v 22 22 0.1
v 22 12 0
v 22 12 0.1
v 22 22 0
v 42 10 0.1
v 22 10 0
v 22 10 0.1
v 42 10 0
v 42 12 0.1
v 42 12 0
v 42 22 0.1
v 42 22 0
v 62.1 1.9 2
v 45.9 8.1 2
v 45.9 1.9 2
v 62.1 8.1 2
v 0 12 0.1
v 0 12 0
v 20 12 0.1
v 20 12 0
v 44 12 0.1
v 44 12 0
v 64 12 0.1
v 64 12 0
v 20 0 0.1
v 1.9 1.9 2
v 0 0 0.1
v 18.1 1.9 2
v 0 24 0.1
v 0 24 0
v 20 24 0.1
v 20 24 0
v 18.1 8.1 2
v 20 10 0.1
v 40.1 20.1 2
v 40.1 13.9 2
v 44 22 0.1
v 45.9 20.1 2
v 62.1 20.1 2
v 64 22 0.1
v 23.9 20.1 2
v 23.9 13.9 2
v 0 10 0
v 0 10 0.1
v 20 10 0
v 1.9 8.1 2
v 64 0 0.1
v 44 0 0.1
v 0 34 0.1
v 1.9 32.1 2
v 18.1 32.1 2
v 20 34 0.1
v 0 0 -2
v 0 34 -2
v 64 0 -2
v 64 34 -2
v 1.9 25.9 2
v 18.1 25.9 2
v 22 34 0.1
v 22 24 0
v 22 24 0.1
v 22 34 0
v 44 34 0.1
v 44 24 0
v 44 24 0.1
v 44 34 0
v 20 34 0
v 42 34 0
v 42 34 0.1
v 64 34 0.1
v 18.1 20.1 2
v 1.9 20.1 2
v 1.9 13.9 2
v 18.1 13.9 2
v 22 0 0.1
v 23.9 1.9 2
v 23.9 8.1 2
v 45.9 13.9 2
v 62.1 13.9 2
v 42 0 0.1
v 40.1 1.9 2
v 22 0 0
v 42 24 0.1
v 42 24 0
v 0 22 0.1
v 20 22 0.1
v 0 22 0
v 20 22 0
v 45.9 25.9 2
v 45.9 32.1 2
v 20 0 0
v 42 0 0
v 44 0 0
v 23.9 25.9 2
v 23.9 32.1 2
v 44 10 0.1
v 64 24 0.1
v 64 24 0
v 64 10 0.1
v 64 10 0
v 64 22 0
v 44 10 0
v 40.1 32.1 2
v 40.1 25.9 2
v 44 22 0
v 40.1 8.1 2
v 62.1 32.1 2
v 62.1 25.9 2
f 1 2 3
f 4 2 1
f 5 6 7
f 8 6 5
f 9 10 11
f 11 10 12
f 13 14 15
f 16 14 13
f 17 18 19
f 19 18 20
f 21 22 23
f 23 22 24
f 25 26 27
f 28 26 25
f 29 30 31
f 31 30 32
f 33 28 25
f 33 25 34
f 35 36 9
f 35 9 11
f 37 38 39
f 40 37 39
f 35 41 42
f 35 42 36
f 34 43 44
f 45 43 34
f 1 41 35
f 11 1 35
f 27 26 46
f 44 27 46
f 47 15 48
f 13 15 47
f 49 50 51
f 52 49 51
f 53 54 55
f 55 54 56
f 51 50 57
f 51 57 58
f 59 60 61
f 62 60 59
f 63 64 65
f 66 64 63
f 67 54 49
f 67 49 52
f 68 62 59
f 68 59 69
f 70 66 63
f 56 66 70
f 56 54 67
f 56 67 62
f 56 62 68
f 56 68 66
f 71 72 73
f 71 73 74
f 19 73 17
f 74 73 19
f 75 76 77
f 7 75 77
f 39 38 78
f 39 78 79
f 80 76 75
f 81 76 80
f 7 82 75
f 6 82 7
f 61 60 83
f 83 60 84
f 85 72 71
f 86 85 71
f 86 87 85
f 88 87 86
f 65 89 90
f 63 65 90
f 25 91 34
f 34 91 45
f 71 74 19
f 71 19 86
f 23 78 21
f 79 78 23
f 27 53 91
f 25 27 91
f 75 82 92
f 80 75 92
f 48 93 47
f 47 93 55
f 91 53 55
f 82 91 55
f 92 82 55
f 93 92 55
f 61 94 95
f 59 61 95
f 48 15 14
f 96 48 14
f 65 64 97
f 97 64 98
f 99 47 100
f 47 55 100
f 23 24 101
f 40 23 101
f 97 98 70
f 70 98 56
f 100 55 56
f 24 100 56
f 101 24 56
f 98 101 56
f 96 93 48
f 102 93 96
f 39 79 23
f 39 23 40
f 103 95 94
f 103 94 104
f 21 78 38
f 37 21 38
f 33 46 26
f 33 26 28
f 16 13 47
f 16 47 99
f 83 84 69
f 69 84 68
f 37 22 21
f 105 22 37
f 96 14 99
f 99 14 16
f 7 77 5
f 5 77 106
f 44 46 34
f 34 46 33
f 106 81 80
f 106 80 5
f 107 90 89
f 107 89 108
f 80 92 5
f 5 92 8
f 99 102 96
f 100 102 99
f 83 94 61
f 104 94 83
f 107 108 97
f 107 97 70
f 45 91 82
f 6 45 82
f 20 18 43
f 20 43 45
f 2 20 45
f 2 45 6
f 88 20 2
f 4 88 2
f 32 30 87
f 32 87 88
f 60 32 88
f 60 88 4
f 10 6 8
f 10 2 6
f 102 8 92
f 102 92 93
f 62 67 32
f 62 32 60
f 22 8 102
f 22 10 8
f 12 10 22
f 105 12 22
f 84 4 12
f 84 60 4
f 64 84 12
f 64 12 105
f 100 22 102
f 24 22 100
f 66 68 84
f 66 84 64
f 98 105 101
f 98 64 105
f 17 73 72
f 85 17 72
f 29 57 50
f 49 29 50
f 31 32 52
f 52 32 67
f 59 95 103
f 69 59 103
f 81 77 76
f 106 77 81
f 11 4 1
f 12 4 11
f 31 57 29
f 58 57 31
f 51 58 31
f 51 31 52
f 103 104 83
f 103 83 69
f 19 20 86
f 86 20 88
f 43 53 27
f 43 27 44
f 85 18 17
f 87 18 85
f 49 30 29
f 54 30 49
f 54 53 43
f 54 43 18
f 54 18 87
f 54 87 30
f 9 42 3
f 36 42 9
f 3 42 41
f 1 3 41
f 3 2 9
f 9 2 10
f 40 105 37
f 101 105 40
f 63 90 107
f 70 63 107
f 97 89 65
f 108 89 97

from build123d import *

# Parameters (mm, degrees)
BOX003_W        = 20
BOX003_H        = 10
BOX003_DEPTH    = 2
CHAMFER003_SIZE = 1.9
BOX004_W        = 20
BOX004_H        = 10
BOX004_DEPTH    = 2
CHAMFER004_SIZE = 1.9
BOX005_W        = 20
BOX005_H        = 10
BOX005_DEPTH    = 2
CHAMFER005_SIZE = 1.9
BOX006_W        = 20
BOX006_H        = 10
BOX006_DEPTH    = 2
CHAMFER006_SIZE = 1.9
BOX007_W        = 20
BOX007_H        = 10
BOX007_DEPTH    = 2
CHAMFER007_SIZE = 1.9
BOX008_W        = 20
BOX008_H        = 10
BOX008_DEPTH    = 2
CHAMFER008_SIZE = 1.9
BOX009_W        = 64
BOX009_H        = 34
BOX009_DEPTH    = 2
BOX002_W        = 20
BOX002_H        = 10
BOX002_DEPTH    = 2
CHAMFER002_SIZE = 1.9
BOX001_W        = 20
BOX001_H        = 10
BOX001_DEPTH    = 2
CHAMFER001_SIZE = 1.9
BOX_W           = 20
BOX_H           = 10
BOX_DEPTH       = 2
CHAMFER_SIZE    = 1.9


with BuildPart() as chamfer003:
    # Box003 → Box003 (new body)
    with BuildSketch(Plane.XY):
        with Locations((10, 5)):
            Rectangle(BOX003_W, BOX003_H)
    extrude(amount=BOX003_DEPTH)

    # Chamfer003
    chamfer003_edges = [chamfer003.edges().sort_by_distance(p)[0] for p in [
        (0, 5, 2),
        (20, 5, 2),
        (10, 0, 2),
        (10, 10, 2),
    ]]
    chamfer(chamfer003_edges, length=CHAMFER003_SIZE)


with BuildPart() as chamfer003_1:
    # Chamfer003 placement: moved
    add(chamfer003.part.moved(Location((0, 12, 0))))


with BuildPart() as chamfer004:
    # Box004 → Box004 (new body)
    with BuildSketch(Plane.XY):
        with Locations((10, 5)):
            Rectangle(BOX004_W, BOX004_H)
    extrude(amount=BOX004_DEPTH)

    # Chamfer004
    chamfer004_edges = [chamfer004.edges().sort_by_distance(p)[0] for p in [
        (0, 5, 2),
        (20, 5, 2),
        (10, 0, 2),
        (10, 10, 2),
    ]]
    chamfer(chamfer004_edges, length=CHAMFER004_SIZE)


with BuildPart() as chamfer004_1:
    # Chamfer004 placement: moved
    add(chamfer004.part.moved(Location((22, 12, 0))))


with BuildPart() as chamfer005:
    # Box005 → Box005 (new body)
    with BuildSketch(Plane.XY):
        with Locations((10, 5)):
            Rectangle(BOX005_W, BOX005_H)
    extrude(amount=BOX005_DEPTH)

    # Chamfer005
    chamfer005_edges = [chamfer005.edges().sort_by_distance(p)[0] for p in [
        (0, 5, 2),
        (20, 5, 2),
        (10, 0, 2),
        (10, 10, 2),
    ]]
    chamfer(chamfer005_edges, length=CHAMFER005_SIZE)


with BuildPart() as chamfer005_1:
    # Chamfer005 placement: moved
    add(chamfer005.part.moved(Location((44, 12, 0))))


with BuildPart() as chamfer006:
    # Box006 → Box006 (new body)
    with BuildSketch(Plane.XY):
        with Locations((10, 5)):
            Rectangle(BOX006_W, BOX006_H)
    extrude(amount=BOX006_DEPTH)

    # Chamfer006
    chamfer006_edges = [chamfer006.edges().sort_by_distance(p)[0] for p in [
        (0, 5, 2),
        (20, 5, 2),
        (10, 0, 2),
        (10, 10, 2),
    ]]
    chamfer(chamfer006_edges, length=CHAMFER006_SIZE)


with BuildPart() as chamfer006_1:
    # Chamfer006 placement: moved
    add(chamfer006.part.moved(Location((0, 24, 0))))


with BuildPart() as chamfer007:
    # Box007 → Box007 (new body)
    with BuildSketch(Plane.XY):
        with Locations((10, 5)):
            Rectangle(BOX007_W, BOX007_H)
    extrude(amount=BOX007_DEPTH)

    # Chamfer007
    chamfer007_edges = [chamfer007.edges().sort_by_distance(p)[0] for p in [
        (0, 5, 2),
        (20, 5, 2),
        (10, 0, 2),
        (10, 10, 2),
    ]]
    chamfer(chamfer007_edges, length=CHAMFER007_SIZE)


with BuildPart() as chamfer007_1:
    # Chamfer007 placement: moved
    add(chamfer007.part.moved(Location((22, 24, 0))))


with BuildPart() as chamfer008:
    # Box008 → Box008 (new body)
    with BuildSketch(Plane.XY):
        with Locations((10, 5)):
            Rectangle(BOX008_W, BOX008_H)
    extrude(amount=BOX008_DEPTH)

    # Chamfer008
    chamfer008_edges = [chamfer008.edges().sort_by_distance(p)[0] for p in [
        (0, 5, 2),
        (20, 5, 2),
        (10, 0, 2),
        (10, 10, 2),
    ]]
    chamfer(chamfer008_edges, length=CHAMFER008_SIZE)


with BuildPart() as chamfer008_1:
    # Chamfer008 placement: moved
    add(chamfer008.part.moved(Location((44, 24, 0))))


with BuildPart() as cubo009:
    # Box009 → Box009 (new body)
    with BuildSketch(Plane.XY.offset(-2)):
        with Locations((32, 17)):
            Rectangle(BOX009_W, BOX009_H)
    extrude(amount=BOX009_DEPTH)


with BuildPart() as chamfer002:
    # Box002 → Box002 (new body)
    with BuildSketch(Plane.XY):
        with Locations((10, 5)):
            Rectangle(BOX002_W, BOX002_H)
    extrude(amount=BOX002_DEPTH)

    # Chamfer002
    chamfer002_edges = [chamfer002.edges().sort_by_distance(p)[0] for p in [
        (0, 5, 2),
        (20, 5, 2),
        (10, 0, 2),
        (10, 10, 2),
    ]]
    chamfer(chamfer002_edges, length=CHAMFER002_SIZE)


with BuildPart() as chamfer002_1:
    # Chamfer002 placement: moved
    add(chamfer002.part.moved(Location((44, 0, 0))))


with BuildPart() as chamfer001:
    # Box001 → Box001 (new body)
    with BuildSketch(Plane.XY):
        with Locations((10, 5)):
            Rectangle(BOX001_W, BOX001_H)
    extrude(amount=BOX001_DEPTH)

    # Chamfer001
    chamfer001_edges = [chamfer001.edges().sort_by_distance(p)[0] for p in [
        (0, 5, 2),
        (20, 5, 2),
        (10, 0, 2),
        (10, 10, 2),
    ]]
    chamfer(chamfer001_edges, length=CHAMFER001_SIZE)


with BuildPart() as chamfer001_1:
    # Chamfer001 placement: moved
    add(chamfer001.part.moved(Location((22, 0, 0))))


with BuildPart() as fusion:
    # Box → Box (new body)
    with BuildSketch(Plane.XY):
        with Locations((10, 5)):
            Rectangle(BOX_W, BOX_H)
    extrude(amount=BOX_DEPTH)

    # Chamfer
    chamfer_edges = [fusion.edges().sort_by_distance(p)[0] for p in [
        (0, 5, 2),
        (20, 5, 2),
        (10, 0, 2),
        (10, 10, 2),
    ]]
    chamfer(chamfer_edges, length=CHAMFER_SIZE)

    # Fusion: union Chamfer003, Chamfer004, Chamfer005, Chamfer006, Chamfer007, Chamfer008, Cubo009, Chamfer002, Chamfer001
    add(chamfer003_1.part)
    add(chamfer004_1.part)
    add(chamfer005_1.part)
    add(chamfer006_1.part)
    add(chamfer007_1.part)
    add(chamfer008_1.part)
    add(cubo009.part)
    add(chamfer002_1.part)
    add(chamfer001_1.part)


solid = fusion.part
